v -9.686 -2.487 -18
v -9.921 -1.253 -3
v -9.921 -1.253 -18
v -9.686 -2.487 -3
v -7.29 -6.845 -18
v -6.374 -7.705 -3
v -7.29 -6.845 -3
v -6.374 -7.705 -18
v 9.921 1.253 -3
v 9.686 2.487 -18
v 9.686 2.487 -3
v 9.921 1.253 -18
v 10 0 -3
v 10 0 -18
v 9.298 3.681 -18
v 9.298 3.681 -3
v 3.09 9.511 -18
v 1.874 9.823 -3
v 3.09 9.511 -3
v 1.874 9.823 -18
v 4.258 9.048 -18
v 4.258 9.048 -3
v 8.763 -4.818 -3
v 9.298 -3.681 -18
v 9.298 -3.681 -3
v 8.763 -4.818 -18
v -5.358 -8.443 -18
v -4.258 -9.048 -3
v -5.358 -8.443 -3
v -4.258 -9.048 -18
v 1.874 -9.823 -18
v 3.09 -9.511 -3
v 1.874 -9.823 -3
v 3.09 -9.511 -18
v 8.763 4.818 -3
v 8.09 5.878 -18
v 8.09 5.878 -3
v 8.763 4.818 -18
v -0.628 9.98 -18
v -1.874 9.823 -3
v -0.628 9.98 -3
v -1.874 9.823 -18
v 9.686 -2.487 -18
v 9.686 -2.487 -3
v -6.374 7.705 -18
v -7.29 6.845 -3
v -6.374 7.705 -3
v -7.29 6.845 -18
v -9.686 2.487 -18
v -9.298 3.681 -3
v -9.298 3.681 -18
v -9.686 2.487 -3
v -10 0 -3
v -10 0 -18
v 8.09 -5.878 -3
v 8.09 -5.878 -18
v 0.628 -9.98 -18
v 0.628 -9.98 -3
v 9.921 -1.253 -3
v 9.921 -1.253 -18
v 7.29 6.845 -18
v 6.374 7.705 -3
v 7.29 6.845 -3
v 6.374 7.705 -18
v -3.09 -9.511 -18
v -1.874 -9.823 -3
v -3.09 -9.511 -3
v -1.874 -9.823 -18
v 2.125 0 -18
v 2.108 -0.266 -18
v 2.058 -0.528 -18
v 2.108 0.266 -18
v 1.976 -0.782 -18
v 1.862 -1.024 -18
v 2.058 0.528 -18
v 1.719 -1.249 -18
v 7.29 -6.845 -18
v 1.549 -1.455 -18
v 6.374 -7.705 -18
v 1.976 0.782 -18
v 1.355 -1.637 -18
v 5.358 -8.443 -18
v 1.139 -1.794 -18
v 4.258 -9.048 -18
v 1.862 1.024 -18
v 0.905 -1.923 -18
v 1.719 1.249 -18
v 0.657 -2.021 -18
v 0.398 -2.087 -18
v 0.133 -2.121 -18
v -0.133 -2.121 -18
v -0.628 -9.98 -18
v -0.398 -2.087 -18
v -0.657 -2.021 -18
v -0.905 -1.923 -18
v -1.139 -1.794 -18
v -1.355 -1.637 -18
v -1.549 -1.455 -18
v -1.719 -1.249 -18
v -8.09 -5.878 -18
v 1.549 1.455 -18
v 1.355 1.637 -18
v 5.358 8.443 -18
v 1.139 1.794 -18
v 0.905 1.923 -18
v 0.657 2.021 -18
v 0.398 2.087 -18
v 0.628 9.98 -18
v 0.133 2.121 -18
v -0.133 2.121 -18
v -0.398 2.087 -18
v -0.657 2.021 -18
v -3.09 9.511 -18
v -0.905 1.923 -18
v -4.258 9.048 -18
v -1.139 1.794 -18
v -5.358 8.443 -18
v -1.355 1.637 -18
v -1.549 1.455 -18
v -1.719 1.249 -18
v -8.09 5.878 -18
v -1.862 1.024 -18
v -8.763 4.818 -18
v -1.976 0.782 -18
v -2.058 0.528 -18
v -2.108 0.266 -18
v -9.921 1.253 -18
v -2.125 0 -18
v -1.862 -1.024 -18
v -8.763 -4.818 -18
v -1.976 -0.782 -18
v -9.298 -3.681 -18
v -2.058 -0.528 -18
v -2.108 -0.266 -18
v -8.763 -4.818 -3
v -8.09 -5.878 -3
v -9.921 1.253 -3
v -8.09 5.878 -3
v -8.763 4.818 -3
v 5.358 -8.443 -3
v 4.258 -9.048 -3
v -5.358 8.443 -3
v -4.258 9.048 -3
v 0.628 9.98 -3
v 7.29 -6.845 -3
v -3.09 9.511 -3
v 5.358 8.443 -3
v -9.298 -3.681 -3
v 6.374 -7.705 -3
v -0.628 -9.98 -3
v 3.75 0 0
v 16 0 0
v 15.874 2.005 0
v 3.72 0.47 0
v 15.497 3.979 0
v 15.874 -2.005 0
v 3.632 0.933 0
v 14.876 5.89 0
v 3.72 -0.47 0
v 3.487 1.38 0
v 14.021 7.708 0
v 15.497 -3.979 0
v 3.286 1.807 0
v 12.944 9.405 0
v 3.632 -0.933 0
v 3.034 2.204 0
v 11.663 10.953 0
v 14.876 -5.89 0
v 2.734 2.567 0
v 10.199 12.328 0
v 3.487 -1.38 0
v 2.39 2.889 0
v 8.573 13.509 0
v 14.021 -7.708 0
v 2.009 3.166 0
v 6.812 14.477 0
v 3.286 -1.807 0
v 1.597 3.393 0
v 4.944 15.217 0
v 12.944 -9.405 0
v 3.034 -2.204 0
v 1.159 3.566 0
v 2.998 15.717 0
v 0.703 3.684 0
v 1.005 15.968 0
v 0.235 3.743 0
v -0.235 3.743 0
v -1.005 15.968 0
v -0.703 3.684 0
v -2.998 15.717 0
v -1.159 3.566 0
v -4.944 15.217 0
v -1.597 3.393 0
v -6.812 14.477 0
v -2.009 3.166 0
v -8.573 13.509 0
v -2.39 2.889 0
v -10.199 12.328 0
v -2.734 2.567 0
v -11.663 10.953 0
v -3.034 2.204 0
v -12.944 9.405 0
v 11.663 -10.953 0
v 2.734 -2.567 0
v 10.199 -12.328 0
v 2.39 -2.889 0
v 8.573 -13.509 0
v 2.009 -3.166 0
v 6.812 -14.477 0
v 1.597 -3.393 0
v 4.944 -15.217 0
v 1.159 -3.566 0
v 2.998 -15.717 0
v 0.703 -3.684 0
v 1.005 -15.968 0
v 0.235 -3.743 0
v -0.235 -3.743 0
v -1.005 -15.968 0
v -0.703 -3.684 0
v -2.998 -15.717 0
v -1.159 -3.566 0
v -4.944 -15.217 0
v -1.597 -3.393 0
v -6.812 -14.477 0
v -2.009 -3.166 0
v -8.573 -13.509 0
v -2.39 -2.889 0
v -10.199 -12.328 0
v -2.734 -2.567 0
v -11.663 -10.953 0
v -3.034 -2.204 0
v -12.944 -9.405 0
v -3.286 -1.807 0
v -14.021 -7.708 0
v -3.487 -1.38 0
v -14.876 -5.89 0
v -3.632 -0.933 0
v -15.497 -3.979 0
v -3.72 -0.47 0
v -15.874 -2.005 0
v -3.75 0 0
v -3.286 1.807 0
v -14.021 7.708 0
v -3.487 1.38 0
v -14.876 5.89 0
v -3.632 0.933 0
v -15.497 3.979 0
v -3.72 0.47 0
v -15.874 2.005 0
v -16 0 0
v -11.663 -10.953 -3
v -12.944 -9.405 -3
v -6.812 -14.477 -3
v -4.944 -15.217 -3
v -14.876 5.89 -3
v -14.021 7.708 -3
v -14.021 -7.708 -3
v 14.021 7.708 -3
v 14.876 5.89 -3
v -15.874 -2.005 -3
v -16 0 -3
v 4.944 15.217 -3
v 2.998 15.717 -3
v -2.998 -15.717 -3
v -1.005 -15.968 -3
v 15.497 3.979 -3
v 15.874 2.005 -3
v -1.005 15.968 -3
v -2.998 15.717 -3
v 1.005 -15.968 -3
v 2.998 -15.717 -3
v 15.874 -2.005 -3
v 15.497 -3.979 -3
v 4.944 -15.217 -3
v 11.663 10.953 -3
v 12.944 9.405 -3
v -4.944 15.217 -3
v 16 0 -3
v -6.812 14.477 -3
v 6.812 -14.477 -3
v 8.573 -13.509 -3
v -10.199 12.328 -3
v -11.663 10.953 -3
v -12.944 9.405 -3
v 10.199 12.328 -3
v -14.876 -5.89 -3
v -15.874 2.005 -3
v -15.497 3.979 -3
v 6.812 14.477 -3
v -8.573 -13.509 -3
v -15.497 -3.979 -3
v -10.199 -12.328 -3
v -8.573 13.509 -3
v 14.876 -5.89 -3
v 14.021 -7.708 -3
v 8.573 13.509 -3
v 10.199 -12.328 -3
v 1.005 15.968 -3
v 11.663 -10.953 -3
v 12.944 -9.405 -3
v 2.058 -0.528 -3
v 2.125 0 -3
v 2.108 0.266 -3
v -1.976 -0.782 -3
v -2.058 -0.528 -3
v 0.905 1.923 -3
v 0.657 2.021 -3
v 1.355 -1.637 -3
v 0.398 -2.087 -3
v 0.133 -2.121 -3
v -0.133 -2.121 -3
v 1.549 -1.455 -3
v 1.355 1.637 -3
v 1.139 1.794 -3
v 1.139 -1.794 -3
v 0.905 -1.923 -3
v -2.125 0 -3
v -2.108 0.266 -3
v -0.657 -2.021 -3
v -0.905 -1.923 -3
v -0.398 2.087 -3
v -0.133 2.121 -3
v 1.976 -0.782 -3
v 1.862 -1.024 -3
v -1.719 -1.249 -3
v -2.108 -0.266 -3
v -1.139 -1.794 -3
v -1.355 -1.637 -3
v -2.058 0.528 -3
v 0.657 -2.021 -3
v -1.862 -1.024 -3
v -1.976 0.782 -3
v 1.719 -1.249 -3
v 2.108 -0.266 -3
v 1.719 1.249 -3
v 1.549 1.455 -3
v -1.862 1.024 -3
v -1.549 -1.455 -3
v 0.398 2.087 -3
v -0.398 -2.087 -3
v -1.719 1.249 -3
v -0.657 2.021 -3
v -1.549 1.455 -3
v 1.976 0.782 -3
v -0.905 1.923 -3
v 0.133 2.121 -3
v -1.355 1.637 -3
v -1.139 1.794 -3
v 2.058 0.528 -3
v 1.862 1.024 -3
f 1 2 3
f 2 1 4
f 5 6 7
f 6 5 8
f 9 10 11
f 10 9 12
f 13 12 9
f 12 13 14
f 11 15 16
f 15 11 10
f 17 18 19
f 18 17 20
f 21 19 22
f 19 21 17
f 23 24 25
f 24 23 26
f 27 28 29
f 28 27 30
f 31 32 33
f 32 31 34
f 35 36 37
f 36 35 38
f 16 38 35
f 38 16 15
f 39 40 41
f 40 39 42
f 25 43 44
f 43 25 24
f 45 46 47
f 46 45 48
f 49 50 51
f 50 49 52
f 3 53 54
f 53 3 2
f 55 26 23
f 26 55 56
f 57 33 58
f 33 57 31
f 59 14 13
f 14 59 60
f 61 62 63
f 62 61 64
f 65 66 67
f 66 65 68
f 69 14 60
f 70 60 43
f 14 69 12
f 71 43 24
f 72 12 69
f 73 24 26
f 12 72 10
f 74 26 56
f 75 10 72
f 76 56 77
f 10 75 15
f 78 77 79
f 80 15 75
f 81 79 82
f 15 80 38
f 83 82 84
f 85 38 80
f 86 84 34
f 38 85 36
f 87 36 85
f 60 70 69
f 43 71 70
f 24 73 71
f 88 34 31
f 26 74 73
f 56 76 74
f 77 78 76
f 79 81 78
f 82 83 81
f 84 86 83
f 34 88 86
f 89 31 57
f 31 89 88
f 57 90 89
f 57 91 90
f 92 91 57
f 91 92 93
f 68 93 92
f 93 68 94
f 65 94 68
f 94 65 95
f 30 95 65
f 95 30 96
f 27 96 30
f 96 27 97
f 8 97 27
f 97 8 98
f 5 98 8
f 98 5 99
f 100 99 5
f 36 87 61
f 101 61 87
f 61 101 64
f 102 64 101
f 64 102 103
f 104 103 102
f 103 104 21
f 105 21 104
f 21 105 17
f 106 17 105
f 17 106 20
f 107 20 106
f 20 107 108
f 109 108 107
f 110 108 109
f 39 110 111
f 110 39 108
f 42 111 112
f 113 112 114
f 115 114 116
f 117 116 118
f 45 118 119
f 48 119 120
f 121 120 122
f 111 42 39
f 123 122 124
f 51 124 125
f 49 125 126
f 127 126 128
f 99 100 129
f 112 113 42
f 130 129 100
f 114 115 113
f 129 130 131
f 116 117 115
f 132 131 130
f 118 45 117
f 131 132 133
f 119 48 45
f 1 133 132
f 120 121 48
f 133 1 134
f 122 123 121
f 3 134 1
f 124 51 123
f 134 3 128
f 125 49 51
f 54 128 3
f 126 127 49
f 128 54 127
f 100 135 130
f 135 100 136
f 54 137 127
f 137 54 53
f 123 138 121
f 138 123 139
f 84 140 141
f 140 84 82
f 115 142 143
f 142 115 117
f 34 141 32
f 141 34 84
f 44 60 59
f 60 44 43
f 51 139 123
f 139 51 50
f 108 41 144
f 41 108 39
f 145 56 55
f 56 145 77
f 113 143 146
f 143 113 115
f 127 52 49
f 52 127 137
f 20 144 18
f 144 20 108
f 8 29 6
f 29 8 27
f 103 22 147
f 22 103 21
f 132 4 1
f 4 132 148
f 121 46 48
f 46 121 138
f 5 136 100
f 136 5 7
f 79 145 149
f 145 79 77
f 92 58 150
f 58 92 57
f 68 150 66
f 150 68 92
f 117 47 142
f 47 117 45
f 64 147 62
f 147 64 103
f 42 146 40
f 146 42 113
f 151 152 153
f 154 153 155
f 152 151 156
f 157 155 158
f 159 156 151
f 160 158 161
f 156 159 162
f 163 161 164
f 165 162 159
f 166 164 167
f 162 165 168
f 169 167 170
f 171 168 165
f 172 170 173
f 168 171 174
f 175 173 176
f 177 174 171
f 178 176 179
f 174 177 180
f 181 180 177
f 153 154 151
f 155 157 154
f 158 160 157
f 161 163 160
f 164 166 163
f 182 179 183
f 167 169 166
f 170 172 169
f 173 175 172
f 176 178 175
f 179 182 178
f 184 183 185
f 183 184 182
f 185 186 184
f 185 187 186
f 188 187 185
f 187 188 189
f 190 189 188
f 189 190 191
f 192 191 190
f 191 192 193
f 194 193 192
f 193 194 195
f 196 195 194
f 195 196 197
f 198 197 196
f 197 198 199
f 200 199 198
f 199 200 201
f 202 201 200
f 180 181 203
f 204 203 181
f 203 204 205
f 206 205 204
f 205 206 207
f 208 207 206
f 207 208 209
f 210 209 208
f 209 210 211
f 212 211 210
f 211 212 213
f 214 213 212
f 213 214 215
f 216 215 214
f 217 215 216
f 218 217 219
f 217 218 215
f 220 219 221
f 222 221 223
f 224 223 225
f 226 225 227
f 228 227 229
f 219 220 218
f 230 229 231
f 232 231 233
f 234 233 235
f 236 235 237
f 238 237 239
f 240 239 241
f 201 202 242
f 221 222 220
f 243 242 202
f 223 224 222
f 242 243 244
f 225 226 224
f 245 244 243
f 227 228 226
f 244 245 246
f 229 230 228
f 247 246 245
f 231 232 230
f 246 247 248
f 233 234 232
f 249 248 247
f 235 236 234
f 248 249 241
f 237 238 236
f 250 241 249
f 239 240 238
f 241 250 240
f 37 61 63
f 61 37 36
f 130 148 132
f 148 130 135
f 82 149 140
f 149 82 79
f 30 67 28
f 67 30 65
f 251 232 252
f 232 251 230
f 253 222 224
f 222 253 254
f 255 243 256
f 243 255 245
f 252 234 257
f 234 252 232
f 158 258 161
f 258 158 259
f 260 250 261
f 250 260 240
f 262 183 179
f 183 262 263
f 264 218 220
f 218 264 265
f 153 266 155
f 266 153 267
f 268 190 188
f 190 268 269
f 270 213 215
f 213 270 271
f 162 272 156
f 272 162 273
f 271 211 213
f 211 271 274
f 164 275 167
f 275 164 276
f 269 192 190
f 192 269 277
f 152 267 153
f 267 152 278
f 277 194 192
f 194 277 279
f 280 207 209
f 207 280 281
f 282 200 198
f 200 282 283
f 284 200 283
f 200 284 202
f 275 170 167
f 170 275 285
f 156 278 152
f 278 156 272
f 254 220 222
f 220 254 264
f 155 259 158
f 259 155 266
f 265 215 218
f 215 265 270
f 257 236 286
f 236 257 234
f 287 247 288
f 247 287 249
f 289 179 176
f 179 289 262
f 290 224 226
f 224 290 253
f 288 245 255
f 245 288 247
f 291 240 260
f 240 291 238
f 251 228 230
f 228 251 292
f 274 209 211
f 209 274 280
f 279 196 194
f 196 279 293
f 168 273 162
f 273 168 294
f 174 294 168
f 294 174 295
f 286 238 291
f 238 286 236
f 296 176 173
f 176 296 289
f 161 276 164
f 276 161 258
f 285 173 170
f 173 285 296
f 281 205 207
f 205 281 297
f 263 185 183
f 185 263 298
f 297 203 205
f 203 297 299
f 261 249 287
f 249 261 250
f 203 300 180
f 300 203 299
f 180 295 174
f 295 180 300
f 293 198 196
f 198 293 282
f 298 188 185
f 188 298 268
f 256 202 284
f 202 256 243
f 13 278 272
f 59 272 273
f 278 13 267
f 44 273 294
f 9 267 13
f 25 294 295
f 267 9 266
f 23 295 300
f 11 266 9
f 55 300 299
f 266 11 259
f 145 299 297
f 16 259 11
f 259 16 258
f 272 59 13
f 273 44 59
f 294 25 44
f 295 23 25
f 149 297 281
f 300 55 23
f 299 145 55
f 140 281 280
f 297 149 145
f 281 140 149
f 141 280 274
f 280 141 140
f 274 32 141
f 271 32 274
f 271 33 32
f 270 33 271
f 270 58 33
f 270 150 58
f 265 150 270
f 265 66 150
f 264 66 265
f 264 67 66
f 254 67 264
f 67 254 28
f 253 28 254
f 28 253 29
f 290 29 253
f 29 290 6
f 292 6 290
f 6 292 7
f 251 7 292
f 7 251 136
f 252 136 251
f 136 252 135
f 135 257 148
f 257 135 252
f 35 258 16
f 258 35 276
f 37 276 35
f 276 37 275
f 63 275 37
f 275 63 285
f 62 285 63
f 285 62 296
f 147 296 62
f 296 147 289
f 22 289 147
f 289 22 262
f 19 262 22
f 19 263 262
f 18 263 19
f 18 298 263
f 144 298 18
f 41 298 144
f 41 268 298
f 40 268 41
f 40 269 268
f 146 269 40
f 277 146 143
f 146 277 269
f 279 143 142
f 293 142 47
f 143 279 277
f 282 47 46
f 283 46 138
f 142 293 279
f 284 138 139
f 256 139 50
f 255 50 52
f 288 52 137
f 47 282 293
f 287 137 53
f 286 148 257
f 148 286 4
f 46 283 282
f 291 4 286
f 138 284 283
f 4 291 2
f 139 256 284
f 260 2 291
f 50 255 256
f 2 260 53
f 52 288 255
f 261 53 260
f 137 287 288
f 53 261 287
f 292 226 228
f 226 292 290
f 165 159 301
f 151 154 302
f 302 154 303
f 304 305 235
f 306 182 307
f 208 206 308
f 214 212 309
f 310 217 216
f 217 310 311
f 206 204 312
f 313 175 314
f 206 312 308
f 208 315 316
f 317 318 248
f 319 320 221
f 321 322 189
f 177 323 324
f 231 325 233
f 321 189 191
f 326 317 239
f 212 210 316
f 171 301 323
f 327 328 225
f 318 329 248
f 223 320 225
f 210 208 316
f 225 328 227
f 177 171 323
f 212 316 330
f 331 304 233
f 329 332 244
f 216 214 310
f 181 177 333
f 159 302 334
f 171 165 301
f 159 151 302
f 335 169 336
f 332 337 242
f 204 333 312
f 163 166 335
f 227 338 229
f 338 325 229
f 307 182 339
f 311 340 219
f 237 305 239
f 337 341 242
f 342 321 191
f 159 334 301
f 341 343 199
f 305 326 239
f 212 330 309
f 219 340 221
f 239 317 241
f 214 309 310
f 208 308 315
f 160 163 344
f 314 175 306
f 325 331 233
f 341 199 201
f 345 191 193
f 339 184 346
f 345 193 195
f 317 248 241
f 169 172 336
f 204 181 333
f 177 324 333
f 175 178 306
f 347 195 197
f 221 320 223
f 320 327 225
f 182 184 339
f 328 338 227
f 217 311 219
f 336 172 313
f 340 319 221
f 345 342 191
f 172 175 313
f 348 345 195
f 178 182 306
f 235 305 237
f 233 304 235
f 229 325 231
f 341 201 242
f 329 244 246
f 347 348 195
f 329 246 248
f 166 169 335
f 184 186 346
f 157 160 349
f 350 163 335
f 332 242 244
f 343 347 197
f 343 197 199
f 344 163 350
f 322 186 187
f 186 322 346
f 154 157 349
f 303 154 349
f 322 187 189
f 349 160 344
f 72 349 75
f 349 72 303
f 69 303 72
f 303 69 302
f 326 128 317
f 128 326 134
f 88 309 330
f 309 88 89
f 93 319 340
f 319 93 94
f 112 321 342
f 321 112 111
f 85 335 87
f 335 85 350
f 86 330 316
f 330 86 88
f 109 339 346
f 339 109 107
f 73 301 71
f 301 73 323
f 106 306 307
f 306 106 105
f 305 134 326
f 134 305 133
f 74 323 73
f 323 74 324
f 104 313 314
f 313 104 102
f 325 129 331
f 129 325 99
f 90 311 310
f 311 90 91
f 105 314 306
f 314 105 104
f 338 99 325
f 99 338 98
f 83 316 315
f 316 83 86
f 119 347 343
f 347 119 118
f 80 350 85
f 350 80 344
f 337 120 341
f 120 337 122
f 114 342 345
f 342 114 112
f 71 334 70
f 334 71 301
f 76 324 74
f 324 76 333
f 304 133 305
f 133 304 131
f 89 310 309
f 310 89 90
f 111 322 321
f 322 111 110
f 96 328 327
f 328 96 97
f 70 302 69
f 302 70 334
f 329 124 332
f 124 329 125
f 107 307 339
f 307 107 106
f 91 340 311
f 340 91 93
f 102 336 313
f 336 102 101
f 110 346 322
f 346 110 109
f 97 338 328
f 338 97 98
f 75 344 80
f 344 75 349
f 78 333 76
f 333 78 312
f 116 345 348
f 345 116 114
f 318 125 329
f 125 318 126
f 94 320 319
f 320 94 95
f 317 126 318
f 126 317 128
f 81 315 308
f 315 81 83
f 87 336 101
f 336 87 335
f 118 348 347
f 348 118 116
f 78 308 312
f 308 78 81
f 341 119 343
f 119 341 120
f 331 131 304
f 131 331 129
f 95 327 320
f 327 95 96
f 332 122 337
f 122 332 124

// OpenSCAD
$fn = 50;


difference() {
	union() {
		translate(v = [0, 0, -18.0000000000]) {
			cylinder(h = 18, r = 10.0000000000);
		}
		translate(v = [0, 0, -3.0000000000]) {
			cylinder(h = 3, r = 16.0000000000);
		}
	}
	union() {
		translate(v = [0, 0, 0]) {
			rotate(a = [0, 0, 0]) {
				difference() {
					union() {
						#translate(v = [0, 0, -18.0000000000]) {
							cylinder(h = 18, r = 2.0000000000);
						}
						#translate(v = [0, 0, -3]) {
							cylinder(h = 3, r1 = 2.1250000000, r2 = 3.7500000000);
						}
						#translate(v = [0, 0, -18.0000000000]) {
							cylinder(h = 18, r = 2.1250000000);
						}
						#translate(v = [0, 0, -18.0000000000]) {
							cylinder(h = 18, r = 2.0000000000);
						}
					}
					union();
				}
			}
		}
	}
}
